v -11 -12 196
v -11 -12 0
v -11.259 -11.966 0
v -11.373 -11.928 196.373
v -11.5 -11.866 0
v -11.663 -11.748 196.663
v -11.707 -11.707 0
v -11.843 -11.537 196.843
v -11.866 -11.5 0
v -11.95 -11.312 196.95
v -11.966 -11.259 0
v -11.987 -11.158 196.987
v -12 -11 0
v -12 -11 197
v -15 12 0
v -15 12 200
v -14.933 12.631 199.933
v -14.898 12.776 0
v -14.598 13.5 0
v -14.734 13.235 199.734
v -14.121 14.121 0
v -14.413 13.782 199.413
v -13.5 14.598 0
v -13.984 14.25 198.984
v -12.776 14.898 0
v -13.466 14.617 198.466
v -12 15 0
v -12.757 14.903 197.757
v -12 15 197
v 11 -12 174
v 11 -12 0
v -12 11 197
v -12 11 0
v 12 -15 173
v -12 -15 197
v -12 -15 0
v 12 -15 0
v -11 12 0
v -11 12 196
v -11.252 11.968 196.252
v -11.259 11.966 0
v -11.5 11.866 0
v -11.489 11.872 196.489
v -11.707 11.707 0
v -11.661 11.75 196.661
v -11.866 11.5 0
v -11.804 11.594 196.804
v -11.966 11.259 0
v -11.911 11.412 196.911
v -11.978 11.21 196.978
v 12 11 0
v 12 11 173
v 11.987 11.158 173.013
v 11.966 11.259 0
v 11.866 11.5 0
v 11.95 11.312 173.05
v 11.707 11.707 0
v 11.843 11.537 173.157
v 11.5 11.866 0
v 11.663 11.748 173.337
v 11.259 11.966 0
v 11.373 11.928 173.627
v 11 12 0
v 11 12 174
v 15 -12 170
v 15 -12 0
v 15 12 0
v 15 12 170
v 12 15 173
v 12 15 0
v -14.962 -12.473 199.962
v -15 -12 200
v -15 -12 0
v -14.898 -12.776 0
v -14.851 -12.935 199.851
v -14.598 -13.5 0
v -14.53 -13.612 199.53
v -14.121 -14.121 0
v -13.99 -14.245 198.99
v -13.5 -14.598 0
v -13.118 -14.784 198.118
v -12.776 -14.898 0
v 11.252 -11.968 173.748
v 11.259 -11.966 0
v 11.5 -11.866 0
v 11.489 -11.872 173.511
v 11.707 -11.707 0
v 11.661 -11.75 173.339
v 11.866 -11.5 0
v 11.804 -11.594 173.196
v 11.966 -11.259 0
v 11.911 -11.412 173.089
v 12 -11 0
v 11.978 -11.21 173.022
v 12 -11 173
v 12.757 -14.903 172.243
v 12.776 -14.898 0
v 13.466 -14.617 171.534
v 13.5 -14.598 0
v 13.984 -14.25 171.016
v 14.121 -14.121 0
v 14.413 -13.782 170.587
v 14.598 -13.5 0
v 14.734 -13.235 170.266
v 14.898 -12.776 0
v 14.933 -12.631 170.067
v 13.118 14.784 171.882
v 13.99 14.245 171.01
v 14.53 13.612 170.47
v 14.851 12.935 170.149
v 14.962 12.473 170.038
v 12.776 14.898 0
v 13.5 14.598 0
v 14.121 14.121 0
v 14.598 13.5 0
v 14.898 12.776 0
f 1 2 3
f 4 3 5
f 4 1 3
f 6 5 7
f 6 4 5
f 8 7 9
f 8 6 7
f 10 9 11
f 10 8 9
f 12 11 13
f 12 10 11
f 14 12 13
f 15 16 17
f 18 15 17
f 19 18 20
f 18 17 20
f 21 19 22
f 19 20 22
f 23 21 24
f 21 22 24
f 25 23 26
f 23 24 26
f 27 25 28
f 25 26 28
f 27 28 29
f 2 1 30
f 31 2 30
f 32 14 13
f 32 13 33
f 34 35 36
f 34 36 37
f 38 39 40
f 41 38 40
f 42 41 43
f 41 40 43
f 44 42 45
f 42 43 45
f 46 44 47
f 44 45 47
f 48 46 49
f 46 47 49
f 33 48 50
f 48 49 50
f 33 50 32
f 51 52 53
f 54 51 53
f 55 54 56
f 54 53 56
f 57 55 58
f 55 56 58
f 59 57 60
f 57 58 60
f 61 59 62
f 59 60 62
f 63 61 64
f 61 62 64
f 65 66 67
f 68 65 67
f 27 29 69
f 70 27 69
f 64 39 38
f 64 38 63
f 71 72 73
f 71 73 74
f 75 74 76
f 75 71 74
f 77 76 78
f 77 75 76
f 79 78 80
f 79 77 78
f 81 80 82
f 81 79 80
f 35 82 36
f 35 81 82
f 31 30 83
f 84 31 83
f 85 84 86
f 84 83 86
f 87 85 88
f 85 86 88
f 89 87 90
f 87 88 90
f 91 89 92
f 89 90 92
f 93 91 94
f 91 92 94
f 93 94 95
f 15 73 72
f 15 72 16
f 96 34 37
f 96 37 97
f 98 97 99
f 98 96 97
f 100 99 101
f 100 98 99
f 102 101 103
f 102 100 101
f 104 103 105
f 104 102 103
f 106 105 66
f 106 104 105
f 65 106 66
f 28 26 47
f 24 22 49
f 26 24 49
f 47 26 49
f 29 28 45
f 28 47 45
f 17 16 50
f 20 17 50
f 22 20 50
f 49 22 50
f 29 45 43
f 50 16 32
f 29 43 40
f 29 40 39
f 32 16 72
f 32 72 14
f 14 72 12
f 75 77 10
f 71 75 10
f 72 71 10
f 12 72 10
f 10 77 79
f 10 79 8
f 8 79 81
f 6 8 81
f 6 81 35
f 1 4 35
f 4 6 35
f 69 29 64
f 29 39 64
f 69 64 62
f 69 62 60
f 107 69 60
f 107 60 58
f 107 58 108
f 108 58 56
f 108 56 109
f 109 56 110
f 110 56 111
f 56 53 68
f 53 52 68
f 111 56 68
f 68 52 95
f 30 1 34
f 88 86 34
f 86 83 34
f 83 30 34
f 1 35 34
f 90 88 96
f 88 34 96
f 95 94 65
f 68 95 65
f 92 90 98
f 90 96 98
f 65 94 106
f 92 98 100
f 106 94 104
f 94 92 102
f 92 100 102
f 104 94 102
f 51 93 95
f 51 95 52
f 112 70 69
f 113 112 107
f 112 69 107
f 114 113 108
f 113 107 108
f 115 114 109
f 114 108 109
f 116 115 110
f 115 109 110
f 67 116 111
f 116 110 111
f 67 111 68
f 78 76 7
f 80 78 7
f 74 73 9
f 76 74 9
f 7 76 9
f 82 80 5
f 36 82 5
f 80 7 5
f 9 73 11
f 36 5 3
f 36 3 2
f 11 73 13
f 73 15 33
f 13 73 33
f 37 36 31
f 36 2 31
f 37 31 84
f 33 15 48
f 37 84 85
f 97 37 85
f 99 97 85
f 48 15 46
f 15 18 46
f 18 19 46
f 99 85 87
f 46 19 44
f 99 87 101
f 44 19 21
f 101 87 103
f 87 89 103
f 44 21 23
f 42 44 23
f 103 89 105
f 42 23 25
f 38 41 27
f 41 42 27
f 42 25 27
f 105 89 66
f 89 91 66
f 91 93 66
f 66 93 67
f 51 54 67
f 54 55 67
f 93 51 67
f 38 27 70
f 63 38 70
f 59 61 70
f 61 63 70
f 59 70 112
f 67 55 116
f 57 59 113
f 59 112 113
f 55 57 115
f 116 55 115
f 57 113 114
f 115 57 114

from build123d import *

# Parameters (mm, degrees)
F0_W     = 30
F0_H     = 30
F0_W_2   = 24
F0_H_2   = 24
F1_DEPTH = 200
F2_R     = 1
F3_R     = 3
F5_DEPTH = 30.001


with BuildPart() as f1:
    # F0 (on Top) → F1 (new body)
    with BuildSketch(Plane.XY):
        Rectangle(F0_W, F0_H)
        Rectangle(F0_W_2, F0_H_2, mode=Mode.SUBTRACT)
    extrude(amount=F1_DEPTH)

    # F2
    f2_edges = [f1.edges().sort_by_distance(p)[0] for p in [
        (-12, -12, 100),
        (-12, 12, 100),
        (12, 12, 100),
        (12, -12, 100),
    ]]
    fillet(f2_edges, radius=F2_R)

    # F3
    f3_edges = [f1.edges().sort_by_distance(p)[0] for p in [
        (-15, 15, 100),
        (-15, -15, 100),
        (15, 15, 100),
        (15, -15, 100),
    ]]
    fillet(f3_edges, radius=F3_R)

    # F4 (on face) → F5 (cut, through all)
    with BuildSketch(Plane.XZ.offset(15)):
        Polygon((-12, 200), (-12, 197), (12, 173), (12, 200), align=None)
        Polygon((-12, 200), (-15, 200), (-12, 197), align=None)
        Polygon((12, 200), (12, 173), (15, 170), (15, 200), align=None)
    extrude(amount=-F5_DEPTH, mode=Mode.SUBTRACT)


solid = f1.part
